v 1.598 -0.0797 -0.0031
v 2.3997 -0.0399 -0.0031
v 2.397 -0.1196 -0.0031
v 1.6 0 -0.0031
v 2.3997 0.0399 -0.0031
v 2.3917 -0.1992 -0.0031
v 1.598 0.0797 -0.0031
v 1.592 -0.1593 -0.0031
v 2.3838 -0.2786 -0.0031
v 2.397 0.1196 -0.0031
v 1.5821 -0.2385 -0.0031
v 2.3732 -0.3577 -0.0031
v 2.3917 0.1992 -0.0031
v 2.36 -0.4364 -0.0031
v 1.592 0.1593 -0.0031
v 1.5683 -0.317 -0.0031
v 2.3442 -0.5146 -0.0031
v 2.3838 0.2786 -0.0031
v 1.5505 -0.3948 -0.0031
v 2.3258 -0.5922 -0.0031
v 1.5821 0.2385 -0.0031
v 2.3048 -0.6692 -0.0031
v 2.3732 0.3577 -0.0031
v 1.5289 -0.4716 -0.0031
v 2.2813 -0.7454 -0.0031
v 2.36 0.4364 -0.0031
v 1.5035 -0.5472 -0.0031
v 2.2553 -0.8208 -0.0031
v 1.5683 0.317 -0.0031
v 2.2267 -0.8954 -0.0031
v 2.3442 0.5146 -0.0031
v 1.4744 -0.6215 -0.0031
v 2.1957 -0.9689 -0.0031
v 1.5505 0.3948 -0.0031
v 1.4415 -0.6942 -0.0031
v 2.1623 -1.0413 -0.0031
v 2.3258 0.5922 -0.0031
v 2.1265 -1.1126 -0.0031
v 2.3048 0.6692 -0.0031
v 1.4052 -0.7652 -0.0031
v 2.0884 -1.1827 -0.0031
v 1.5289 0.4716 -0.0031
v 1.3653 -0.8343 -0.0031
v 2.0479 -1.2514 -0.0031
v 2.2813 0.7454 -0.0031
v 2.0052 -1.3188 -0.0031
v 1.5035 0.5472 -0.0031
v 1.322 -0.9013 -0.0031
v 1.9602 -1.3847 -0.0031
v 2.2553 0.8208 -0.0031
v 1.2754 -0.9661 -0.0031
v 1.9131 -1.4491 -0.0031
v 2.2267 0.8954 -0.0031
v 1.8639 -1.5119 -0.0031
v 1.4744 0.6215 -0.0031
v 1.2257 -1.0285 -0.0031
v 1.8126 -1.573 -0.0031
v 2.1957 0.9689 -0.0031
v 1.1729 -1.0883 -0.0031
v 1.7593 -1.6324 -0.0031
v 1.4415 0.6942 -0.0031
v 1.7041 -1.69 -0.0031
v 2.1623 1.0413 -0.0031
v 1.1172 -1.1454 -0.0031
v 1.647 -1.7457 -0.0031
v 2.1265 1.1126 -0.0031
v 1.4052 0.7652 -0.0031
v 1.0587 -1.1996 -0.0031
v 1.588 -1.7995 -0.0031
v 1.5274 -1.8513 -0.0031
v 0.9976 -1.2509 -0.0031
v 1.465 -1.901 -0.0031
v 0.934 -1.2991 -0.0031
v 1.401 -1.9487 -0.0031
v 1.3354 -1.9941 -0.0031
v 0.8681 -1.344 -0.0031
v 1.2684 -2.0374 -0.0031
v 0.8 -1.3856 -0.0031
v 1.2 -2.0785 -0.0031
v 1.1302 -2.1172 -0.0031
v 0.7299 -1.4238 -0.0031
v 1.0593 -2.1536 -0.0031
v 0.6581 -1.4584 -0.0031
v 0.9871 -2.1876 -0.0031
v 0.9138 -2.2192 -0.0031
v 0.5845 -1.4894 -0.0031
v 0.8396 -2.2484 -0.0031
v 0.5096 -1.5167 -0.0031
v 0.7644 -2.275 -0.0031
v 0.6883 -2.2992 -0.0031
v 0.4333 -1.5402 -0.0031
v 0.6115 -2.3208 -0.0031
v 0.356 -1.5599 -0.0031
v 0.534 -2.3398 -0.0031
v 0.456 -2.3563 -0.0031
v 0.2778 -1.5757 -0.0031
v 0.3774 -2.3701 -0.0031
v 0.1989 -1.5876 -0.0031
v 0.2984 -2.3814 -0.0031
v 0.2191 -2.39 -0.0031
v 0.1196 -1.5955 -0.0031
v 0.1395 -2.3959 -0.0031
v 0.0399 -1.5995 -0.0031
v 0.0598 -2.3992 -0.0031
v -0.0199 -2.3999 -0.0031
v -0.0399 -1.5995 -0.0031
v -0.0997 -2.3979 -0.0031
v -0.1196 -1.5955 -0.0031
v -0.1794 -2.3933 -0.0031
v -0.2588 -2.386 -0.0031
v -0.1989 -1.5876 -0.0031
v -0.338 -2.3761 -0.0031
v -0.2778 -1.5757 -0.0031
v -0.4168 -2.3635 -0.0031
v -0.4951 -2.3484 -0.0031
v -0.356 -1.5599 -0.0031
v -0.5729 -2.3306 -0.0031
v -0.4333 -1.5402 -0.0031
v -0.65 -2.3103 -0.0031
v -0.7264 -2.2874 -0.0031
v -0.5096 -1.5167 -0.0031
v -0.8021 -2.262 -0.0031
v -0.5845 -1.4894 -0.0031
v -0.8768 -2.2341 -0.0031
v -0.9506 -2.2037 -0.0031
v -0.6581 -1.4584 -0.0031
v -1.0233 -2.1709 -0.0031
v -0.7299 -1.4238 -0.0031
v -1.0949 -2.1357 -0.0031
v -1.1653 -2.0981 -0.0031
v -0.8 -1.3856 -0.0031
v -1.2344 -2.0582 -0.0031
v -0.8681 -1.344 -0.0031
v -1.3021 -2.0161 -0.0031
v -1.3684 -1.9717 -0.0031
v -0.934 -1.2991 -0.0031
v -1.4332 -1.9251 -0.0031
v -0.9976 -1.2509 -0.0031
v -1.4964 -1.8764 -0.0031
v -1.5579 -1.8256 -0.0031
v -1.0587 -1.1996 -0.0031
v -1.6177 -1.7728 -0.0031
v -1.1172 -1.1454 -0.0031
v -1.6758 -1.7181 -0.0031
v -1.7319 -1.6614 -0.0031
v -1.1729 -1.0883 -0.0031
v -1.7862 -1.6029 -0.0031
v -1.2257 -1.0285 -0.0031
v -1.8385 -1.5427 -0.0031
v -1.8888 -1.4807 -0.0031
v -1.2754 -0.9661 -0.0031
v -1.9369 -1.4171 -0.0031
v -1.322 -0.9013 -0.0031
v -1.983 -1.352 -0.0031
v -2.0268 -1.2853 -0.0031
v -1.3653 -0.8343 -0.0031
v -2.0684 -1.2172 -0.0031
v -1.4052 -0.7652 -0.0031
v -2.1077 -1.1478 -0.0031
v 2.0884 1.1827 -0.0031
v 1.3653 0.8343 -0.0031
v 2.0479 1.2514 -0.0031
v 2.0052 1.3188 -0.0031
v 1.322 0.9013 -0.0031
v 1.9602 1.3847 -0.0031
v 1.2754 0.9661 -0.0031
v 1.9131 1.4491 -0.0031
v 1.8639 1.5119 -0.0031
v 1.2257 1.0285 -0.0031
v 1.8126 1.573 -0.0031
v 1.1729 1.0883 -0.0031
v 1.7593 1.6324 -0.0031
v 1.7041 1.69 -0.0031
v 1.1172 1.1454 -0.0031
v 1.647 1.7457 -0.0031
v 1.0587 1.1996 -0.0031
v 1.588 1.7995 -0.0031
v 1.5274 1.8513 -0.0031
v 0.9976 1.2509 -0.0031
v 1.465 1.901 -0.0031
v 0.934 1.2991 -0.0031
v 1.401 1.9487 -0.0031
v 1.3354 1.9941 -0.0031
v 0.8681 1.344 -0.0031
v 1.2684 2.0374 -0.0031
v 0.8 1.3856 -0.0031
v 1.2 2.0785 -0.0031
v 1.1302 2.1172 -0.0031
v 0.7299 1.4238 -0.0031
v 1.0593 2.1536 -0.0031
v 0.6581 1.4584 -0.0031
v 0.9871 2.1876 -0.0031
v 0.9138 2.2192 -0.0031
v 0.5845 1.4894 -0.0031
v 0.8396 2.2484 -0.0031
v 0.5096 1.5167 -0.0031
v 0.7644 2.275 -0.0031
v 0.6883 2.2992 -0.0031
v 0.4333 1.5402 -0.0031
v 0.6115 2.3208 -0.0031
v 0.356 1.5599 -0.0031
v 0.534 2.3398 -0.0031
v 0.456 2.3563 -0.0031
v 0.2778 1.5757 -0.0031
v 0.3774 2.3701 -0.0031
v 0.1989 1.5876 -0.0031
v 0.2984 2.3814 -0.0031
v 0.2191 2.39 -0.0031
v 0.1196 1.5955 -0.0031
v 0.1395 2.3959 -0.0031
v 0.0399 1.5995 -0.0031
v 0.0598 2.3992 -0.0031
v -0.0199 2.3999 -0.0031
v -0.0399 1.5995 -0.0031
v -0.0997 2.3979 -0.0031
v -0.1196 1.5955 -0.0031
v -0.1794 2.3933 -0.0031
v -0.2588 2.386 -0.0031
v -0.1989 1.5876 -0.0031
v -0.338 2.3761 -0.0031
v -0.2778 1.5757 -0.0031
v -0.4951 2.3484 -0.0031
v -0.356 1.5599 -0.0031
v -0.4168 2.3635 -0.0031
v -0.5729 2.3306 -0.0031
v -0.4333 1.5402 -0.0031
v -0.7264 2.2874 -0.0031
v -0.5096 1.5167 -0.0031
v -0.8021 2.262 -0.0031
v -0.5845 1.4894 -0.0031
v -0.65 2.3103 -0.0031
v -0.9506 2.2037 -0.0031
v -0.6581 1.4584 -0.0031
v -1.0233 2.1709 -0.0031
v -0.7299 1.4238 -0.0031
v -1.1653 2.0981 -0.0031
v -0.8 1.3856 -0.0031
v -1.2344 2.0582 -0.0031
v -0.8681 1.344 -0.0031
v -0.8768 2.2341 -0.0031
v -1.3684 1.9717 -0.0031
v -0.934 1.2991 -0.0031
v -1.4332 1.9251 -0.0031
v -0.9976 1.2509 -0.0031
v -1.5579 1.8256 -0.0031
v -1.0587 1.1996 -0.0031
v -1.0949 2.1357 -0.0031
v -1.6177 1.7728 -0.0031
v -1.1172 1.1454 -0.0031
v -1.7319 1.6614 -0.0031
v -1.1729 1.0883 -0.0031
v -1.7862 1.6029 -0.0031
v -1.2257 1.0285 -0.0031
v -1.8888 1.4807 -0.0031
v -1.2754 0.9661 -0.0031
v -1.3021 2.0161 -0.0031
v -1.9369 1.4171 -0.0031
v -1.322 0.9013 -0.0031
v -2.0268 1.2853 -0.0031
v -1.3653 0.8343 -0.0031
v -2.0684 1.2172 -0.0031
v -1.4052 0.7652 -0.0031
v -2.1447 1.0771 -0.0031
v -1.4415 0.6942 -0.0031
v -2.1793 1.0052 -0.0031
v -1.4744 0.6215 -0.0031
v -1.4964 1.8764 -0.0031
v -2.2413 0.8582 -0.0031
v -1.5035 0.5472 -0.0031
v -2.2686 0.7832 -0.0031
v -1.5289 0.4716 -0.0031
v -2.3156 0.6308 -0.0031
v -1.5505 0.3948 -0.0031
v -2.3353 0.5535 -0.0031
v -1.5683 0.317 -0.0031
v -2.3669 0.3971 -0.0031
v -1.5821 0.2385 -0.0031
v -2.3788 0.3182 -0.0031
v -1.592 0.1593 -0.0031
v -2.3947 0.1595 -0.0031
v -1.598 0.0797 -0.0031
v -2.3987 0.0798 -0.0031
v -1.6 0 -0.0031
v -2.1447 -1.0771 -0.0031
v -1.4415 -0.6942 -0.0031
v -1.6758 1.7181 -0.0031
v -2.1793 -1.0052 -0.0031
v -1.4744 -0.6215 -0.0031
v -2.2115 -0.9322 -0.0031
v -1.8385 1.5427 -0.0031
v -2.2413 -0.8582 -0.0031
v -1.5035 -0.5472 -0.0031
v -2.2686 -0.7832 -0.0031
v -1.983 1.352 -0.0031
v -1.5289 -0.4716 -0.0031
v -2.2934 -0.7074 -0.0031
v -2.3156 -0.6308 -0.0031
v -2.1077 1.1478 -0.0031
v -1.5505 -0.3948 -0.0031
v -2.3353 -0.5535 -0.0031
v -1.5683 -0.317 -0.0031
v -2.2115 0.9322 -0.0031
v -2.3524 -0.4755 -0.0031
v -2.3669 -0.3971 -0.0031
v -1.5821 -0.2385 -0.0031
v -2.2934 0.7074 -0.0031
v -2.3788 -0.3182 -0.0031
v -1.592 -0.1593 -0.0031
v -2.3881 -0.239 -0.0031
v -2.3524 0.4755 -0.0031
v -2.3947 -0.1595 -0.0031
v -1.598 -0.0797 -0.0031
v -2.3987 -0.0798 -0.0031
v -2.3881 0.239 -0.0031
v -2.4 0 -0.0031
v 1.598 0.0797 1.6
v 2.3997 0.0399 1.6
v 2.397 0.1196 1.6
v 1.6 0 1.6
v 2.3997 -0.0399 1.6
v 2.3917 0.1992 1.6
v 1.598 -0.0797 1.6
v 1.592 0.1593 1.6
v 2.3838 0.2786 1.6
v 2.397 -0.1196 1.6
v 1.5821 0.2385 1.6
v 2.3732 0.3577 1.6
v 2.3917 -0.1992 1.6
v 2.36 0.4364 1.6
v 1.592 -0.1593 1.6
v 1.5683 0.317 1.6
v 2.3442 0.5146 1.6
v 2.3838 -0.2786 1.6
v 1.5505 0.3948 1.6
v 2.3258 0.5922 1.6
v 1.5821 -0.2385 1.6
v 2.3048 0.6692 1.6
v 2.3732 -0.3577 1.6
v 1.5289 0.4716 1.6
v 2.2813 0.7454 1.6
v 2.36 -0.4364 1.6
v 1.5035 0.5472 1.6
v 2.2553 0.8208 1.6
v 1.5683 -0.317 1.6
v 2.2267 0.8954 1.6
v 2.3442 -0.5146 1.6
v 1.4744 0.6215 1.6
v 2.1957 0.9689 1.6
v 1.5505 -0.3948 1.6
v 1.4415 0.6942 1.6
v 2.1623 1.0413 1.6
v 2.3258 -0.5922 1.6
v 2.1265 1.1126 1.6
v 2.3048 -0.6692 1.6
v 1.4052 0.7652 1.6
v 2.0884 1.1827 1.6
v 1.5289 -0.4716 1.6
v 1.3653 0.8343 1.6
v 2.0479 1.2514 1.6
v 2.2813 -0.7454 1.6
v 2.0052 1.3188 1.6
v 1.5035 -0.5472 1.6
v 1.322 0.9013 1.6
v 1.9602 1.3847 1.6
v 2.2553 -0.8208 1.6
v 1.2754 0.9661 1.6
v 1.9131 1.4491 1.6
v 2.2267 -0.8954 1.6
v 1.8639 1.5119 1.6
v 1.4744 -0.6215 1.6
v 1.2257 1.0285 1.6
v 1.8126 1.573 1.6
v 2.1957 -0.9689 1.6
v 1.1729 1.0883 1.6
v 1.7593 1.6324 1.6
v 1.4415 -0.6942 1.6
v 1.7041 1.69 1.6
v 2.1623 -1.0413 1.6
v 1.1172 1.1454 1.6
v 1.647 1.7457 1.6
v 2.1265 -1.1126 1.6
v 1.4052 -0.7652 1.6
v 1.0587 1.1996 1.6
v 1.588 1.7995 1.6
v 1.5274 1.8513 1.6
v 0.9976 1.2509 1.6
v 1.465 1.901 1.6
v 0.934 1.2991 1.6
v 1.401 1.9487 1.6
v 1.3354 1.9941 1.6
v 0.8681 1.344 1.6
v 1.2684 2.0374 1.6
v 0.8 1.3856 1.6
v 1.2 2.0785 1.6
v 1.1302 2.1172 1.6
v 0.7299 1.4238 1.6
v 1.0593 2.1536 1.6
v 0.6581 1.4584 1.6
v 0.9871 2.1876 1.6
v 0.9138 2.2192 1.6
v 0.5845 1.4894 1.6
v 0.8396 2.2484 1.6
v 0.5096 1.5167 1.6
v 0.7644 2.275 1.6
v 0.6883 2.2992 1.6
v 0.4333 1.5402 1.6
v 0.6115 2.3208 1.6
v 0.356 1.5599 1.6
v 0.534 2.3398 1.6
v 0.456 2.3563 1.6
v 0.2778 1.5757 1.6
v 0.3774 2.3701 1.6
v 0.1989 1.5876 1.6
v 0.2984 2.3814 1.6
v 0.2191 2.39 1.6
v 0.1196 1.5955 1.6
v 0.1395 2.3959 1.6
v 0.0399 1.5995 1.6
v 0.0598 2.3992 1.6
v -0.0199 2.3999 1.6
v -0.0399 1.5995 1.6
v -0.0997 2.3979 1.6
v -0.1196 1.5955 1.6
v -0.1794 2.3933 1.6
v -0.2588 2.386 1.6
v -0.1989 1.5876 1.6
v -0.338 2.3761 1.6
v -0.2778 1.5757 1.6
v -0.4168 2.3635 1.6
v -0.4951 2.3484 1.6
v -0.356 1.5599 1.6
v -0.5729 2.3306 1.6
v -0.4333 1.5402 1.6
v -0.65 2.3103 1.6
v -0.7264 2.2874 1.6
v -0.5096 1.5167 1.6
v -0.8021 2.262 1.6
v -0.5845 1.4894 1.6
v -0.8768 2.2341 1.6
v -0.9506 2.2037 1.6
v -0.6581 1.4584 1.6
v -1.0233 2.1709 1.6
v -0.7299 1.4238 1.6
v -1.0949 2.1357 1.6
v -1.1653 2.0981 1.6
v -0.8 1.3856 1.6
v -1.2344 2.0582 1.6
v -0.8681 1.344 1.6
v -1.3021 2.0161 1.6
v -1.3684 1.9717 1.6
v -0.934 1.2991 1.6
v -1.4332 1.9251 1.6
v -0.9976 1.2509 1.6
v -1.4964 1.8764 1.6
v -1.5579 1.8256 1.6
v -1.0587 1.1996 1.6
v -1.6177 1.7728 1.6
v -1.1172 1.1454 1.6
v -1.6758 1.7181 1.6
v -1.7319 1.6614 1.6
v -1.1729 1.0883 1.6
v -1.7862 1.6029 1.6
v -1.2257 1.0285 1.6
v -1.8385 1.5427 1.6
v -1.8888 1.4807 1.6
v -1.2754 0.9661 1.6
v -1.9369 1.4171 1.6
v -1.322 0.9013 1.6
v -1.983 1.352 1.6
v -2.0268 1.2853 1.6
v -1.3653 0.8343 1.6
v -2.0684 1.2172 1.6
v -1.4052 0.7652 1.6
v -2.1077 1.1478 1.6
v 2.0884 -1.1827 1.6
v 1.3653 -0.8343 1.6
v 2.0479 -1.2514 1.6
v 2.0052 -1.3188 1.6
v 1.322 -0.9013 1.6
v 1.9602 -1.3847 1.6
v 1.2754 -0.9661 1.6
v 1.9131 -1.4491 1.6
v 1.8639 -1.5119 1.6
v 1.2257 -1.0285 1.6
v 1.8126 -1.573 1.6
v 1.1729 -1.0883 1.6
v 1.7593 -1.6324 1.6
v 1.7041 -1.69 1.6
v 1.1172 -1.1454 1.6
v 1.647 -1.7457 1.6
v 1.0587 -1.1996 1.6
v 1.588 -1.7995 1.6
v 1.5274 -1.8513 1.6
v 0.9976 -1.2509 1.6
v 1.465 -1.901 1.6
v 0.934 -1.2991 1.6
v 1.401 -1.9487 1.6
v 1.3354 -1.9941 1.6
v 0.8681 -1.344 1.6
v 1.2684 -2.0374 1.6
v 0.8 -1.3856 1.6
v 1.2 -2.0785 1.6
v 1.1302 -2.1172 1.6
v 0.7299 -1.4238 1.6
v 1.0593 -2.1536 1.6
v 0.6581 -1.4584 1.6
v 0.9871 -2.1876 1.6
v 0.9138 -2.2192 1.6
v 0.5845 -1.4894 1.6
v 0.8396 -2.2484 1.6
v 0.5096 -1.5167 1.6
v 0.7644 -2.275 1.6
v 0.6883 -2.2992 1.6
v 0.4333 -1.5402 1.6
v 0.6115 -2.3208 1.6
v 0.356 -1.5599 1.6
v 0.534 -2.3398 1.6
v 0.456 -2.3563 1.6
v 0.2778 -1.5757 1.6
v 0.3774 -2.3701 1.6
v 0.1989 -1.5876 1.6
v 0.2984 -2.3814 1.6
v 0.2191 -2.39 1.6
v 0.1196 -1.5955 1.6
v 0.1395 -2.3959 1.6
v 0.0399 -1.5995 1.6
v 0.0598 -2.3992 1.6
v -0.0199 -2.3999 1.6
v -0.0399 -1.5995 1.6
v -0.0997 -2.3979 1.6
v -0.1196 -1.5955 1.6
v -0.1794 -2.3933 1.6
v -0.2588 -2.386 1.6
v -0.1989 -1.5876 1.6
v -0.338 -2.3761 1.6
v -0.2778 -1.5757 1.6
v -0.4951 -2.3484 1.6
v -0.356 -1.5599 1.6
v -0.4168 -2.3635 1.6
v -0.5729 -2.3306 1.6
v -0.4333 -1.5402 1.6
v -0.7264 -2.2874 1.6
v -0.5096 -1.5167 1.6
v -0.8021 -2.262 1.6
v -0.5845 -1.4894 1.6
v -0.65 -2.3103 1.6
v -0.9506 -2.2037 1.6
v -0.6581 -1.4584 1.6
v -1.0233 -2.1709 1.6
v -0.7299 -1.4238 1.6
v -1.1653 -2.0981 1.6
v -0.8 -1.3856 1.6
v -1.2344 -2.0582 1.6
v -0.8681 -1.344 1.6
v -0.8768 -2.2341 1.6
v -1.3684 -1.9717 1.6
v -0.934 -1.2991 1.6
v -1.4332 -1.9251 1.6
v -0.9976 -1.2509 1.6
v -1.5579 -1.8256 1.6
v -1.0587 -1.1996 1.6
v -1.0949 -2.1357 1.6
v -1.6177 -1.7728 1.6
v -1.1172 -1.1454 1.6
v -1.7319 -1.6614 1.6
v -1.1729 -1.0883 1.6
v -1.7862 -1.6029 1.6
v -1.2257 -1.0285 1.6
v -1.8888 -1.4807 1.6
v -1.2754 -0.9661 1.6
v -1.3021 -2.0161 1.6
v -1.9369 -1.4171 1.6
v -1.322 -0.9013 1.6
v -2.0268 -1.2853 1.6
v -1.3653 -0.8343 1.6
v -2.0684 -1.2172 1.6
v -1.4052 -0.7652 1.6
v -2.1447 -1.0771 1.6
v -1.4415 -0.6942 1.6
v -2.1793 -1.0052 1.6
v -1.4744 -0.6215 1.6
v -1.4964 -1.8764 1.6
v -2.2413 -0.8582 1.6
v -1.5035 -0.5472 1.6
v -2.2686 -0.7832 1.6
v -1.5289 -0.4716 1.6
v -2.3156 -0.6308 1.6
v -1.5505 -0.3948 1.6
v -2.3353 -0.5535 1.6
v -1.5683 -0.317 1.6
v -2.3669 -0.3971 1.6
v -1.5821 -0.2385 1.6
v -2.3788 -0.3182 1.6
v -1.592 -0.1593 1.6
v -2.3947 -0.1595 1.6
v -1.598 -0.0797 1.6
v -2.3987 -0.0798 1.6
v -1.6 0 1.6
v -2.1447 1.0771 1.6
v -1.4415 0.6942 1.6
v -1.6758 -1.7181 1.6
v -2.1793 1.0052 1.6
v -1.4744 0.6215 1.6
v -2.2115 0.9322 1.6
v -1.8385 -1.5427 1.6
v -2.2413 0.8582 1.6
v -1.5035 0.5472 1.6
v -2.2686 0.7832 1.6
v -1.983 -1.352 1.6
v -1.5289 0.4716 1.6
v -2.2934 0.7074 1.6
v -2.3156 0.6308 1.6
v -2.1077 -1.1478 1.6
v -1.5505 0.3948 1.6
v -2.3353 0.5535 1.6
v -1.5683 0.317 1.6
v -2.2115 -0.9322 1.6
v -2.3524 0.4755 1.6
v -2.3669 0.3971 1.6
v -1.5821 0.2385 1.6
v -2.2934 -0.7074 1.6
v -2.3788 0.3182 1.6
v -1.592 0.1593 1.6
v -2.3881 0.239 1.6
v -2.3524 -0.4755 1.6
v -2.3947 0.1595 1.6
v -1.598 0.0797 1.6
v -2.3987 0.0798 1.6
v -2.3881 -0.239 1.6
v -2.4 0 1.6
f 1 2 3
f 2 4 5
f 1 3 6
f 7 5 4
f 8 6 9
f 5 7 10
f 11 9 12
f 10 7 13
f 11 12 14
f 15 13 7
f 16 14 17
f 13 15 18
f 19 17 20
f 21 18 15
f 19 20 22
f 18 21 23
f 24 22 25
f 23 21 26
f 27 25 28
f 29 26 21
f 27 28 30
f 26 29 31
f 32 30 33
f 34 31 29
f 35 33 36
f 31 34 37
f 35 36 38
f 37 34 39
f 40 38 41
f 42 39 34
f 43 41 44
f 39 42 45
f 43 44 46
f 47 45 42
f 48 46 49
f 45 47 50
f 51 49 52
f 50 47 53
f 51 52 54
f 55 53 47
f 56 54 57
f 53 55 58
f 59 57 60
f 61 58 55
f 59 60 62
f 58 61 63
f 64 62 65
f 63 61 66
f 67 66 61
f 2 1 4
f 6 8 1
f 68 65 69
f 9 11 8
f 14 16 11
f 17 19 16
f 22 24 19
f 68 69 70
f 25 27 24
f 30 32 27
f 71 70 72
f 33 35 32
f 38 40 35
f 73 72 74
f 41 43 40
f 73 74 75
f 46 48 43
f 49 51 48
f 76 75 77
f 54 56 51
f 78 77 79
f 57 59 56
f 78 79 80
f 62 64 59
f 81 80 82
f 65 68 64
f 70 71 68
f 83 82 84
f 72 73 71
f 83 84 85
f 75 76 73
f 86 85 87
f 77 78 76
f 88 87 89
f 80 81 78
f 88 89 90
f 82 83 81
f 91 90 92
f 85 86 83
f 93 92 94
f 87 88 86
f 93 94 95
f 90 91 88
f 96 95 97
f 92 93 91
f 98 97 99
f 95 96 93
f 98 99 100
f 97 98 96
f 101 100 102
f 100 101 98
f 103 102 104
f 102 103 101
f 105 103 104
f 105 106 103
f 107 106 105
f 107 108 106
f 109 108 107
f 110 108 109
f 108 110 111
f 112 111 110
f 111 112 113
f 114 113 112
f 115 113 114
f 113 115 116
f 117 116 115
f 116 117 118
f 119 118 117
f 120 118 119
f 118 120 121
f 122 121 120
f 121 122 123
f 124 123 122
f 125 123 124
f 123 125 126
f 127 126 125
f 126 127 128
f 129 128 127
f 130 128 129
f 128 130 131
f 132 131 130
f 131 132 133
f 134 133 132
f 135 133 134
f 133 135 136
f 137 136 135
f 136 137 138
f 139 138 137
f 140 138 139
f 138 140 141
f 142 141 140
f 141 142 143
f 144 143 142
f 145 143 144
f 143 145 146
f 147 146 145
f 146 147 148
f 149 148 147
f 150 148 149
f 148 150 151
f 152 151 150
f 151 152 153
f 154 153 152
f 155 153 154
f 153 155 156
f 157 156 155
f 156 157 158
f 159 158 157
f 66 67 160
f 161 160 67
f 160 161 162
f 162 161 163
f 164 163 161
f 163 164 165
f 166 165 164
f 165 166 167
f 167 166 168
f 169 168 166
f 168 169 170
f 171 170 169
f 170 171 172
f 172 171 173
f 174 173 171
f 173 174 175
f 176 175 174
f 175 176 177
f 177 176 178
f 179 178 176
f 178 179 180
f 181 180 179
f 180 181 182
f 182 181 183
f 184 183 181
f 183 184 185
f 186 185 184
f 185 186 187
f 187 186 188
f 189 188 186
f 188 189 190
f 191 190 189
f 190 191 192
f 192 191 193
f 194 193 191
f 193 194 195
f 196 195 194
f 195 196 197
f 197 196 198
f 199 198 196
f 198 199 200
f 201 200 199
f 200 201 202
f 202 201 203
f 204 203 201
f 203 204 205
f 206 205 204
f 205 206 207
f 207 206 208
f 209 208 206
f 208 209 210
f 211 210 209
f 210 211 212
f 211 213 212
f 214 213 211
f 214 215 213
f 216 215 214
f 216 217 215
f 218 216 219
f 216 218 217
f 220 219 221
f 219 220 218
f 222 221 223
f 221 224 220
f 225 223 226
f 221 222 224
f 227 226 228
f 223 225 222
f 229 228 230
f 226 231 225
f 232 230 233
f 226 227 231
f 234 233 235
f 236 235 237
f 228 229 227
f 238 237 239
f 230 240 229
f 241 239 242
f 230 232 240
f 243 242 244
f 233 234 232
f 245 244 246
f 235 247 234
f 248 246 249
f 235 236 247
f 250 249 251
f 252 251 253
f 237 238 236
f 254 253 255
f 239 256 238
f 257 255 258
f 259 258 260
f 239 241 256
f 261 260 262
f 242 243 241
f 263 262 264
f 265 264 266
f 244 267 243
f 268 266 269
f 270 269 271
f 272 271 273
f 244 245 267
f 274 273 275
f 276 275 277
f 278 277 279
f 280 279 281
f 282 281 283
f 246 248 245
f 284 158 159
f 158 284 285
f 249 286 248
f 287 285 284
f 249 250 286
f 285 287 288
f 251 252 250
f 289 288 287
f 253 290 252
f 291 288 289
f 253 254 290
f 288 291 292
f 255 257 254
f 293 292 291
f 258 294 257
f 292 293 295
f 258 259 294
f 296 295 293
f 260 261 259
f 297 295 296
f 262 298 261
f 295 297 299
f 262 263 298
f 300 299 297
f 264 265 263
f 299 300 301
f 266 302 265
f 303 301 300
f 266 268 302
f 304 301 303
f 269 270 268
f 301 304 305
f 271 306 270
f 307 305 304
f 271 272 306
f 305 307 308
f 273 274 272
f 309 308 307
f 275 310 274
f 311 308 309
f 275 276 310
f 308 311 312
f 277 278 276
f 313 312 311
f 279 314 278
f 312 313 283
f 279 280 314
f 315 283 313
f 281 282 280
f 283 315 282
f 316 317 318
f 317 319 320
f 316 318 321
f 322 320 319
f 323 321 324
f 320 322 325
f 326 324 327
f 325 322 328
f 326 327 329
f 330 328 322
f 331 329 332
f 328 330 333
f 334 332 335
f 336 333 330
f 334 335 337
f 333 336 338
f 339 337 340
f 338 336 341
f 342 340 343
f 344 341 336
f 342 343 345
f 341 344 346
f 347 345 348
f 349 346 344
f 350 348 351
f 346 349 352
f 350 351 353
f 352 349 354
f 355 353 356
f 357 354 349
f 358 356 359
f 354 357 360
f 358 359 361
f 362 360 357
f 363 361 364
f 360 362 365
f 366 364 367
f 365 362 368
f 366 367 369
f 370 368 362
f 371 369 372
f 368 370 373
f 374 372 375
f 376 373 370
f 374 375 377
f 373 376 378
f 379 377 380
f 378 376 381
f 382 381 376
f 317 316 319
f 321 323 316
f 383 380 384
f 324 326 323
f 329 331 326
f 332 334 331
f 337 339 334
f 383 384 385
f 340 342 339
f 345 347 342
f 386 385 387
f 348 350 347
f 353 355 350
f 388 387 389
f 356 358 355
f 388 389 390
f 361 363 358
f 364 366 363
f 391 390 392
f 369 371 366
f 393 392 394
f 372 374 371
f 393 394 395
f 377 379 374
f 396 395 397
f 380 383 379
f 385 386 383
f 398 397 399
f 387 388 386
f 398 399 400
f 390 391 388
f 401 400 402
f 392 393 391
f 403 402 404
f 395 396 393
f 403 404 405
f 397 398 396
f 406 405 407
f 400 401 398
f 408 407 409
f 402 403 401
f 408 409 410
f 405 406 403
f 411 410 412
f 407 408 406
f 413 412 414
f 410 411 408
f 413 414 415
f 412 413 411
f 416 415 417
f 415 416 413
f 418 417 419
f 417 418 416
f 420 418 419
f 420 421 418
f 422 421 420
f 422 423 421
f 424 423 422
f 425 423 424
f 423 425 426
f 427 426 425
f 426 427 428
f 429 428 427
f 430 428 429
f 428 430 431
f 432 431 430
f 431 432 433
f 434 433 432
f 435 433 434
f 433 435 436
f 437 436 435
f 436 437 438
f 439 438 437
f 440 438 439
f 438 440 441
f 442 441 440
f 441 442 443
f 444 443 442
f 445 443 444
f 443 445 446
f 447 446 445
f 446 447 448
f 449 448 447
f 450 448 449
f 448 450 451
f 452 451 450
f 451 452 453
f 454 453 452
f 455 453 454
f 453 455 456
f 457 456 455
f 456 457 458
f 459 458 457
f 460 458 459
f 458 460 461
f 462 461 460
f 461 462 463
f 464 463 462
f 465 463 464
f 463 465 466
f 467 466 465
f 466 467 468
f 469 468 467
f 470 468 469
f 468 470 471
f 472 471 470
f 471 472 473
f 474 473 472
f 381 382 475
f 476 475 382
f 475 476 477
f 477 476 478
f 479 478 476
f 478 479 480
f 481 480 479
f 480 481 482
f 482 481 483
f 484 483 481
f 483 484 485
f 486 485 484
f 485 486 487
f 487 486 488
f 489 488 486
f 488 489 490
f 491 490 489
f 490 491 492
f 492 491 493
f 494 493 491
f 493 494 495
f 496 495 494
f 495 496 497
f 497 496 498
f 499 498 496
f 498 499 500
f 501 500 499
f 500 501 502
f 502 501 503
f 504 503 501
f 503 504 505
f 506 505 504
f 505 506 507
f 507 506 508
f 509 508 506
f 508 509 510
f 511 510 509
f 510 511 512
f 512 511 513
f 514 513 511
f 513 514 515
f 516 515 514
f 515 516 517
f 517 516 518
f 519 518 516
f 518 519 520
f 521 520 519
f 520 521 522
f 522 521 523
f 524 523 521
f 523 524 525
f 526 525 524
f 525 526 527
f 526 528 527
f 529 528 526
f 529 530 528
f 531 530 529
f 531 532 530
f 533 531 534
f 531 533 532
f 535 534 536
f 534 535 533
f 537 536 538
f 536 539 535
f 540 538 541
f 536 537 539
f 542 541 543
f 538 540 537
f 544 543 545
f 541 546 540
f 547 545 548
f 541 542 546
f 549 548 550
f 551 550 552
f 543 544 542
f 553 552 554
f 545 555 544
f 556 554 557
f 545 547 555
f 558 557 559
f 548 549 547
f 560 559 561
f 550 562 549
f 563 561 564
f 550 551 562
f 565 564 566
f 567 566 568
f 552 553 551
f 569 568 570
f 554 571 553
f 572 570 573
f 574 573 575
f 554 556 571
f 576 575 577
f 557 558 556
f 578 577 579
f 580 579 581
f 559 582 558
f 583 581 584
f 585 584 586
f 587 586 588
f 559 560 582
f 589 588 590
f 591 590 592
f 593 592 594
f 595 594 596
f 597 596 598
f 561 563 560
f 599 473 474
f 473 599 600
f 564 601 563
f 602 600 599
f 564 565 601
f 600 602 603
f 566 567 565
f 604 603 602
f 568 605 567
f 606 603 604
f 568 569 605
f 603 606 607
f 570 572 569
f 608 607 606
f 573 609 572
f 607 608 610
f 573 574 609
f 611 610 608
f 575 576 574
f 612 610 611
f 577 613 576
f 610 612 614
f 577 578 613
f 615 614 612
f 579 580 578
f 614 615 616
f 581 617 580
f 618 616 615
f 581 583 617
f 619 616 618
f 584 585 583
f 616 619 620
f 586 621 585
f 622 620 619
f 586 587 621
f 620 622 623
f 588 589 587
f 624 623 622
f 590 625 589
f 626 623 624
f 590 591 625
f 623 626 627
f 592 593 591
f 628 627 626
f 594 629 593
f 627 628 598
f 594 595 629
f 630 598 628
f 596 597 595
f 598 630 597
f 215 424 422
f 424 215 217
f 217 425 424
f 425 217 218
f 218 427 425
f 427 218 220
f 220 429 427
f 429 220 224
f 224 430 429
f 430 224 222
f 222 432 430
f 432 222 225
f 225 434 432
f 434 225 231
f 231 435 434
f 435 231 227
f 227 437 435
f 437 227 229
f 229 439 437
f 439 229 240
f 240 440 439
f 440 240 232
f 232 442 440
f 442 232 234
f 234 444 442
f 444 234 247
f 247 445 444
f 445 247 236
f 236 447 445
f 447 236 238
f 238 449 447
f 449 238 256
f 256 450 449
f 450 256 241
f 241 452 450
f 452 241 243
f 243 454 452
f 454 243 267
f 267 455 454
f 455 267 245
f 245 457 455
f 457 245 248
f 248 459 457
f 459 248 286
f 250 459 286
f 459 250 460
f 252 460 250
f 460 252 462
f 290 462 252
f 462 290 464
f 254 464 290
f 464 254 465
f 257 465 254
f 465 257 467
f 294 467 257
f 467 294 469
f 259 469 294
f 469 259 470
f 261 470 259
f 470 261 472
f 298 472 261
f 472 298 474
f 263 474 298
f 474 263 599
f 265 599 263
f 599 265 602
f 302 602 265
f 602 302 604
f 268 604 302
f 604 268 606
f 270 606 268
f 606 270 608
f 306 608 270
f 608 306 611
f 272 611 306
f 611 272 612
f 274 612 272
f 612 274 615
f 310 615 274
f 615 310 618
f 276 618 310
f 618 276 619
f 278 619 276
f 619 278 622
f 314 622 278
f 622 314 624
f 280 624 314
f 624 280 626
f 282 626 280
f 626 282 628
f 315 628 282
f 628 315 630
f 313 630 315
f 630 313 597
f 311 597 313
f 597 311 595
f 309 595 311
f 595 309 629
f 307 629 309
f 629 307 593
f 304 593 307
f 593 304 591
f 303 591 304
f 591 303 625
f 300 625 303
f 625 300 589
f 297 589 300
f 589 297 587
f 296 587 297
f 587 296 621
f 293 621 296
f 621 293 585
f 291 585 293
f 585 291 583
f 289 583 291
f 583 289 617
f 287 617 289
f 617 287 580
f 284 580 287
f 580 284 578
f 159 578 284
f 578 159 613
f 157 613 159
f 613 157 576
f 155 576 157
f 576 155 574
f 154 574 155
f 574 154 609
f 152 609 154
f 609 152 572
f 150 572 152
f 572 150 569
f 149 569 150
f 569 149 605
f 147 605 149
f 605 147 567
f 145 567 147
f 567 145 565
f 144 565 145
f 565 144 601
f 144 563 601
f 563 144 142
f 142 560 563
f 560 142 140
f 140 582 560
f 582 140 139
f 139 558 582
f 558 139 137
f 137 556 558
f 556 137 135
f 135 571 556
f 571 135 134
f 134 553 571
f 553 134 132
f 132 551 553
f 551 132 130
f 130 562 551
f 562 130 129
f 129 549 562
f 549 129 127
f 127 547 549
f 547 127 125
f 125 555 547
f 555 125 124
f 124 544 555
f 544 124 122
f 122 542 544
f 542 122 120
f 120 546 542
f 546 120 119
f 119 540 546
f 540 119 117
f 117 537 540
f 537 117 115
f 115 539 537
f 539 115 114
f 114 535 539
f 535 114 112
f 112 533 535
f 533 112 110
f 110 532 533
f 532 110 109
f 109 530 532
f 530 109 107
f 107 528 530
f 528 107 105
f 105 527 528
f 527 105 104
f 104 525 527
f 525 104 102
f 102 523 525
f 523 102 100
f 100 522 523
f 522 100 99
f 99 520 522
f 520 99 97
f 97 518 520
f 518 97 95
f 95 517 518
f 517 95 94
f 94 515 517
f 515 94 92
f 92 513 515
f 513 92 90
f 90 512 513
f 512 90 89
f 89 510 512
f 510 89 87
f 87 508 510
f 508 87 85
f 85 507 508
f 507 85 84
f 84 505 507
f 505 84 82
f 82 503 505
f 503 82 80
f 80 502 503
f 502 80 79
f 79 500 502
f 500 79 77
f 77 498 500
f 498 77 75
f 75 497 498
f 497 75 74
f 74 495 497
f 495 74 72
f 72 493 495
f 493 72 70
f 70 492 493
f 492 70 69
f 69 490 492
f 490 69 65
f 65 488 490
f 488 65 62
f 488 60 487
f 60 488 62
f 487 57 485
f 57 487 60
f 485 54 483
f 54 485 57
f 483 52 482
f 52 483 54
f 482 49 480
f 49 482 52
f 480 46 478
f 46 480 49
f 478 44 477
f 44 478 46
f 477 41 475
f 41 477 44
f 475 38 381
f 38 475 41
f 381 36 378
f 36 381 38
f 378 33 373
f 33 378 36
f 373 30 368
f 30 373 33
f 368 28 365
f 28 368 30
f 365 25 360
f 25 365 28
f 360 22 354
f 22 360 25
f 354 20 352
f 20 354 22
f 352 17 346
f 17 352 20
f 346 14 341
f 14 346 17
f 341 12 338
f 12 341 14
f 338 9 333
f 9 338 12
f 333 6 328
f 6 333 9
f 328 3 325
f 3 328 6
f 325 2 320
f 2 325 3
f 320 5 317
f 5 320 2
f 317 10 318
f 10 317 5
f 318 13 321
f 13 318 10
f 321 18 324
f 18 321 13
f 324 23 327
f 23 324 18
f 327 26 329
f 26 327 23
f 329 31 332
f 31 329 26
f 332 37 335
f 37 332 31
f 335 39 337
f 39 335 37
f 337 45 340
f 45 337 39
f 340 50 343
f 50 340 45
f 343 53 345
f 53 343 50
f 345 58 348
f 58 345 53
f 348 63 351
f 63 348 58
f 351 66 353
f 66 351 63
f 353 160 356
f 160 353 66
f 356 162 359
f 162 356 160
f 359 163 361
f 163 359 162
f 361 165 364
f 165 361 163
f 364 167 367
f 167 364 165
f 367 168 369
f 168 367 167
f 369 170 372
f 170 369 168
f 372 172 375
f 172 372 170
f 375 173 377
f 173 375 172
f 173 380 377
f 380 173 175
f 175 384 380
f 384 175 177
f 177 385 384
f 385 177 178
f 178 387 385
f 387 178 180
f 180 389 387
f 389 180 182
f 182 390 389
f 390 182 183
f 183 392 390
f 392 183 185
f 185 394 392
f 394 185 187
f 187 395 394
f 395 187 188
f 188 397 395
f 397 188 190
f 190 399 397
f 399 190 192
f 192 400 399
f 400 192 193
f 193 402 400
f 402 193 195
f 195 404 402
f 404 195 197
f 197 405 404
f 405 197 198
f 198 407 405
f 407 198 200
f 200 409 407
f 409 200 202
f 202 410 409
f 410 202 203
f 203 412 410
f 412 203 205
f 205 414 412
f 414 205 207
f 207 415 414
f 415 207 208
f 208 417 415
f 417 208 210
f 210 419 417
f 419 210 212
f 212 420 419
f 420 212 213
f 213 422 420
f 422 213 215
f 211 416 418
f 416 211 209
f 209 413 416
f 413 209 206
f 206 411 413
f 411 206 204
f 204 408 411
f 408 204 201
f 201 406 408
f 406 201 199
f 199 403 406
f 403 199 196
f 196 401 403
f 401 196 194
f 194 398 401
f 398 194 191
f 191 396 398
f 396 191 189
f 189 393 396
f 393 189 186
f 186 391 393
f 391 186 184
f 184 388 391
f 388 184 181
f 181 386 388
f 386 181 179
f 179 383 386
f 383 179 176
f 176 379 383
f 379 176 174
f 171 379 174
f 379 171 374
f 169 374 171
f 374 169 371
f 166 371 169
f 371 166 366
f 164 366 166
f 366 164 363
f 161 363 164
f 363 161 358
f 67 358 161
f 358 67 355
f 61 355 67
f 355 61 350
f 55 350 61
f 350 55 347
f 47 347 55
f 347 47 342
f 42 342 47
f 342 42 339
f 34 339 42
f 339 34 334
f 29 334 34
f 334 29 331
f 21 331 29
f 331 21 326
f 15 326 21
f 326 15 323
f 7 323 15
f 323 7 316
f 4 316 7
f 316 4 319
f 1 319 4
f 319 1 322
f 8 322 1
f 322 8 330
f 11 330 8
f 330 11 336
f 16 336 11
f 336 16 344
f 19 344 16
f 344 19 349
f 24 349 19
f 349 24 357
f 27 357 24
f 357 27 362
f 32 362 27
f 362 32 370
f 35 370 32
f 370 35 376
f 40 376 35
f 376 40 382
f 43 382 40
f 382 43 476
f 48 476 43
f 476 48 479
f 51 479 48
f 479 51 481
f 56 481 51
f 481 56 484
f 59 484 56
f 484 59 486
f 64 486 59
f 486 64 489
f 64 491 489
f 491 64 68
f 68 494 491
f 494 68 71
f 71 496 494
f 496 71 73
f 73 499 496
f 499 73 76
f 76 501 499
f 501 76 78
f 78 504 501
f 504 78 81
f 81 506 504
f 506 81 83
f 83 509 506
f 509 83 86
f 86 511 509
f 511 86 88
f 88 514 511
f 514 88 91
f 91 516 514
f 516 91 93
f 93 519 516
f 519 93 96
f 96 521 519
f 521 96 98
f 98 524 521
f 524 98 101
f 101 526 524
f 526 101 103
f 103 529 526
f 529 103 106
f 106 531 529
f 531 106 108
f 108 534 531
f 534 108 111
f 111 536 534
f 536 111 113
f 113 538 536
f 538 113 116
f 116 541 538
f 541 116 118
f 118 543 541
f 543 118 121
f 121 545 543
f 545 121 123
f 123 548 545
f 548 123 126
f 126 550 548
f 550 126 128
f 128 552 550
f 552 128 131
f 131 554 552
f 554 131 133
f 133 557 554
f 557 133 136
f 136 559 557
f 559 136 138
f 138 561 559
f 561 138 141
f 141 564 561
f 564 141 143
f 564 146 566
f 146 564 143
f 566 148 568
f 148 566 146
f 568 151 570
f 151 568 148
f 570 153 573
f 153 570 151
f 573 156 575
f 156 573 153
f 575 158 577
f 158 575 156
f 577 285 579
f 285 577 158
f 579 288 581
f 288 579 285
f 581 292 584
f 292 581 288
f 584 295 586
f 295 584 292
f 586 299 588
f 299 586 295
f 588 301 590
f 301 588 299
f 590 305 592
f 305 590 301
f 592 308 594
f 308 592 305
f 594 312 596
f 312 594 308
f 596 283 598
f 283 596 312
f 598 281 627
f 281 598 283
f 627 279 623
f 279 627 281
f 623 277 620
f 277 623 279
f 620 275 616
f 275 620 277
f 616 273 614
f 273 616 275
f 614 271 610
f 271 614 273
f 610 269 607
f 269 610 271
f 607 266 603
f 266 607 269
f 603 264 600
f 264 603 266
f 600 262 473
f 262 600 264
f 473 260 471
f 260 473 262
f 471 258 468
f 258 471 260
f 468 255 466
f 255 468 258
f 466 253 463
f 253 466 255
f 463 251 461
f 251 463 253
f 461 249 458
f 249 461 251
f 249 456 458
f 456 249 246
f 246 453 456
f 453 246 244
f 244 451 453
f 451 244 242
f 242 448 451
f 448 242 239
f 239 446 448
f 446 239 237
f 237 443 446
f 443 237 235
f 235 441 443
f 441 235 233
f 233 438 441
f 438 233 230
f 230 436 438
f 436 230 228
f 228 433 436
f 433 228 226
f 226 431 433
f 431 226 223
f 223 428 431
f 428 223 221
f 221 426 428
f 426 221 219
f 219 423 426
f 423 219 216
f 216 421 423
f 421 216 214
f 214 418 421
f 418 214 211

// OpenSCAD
use <../lib.scad>
use <s/3626cs02.scad>
use <s/3626p8cs01.scad>
$fa=1; $fs=0.2;
function ldraw_lib__3626cp8c(realsolid=false) = [
// 0 Minifig Head Peach Lips, Smile, Black Eyebrows Pattern (Hollow Stud)
// 0 Name: 3626cp8c.dat
// 0 Author: Howard Lande [HowardLande]
// 0 !LDRAW_ORG Part UPDATE 2015-01
// 0 !LICENSE Licensed under CC BY 2.0 and CC BY 4.0 : see CAreadme.txt
// 
// 0 BFC CERTIFY CCW
  [0,"BFC","CERTIFY"],
  [0,"BFC","CCW"],
// 
// 0 !HISTORY 2015-10-11 [PTadmin] Official Update 2015-01
// 
// 
// 1 16 0 0 0 1 0 0 0 1 0 0 0 1 s\3626cs02.dat
  [1,16,0,0,0,1,0,0,0,1,0,0,0,1, ldraw_lib__s__3626cs02(realsolid)],
// 1 16 0 0 0 1 0 0 0 1 0 0 0 1 s\3626p8cs01.dat
  [1,16,0,0,0,1,0,0,0,1,0,0,0,1, ldraw_lib__s__3626p8cs01(realsolid)],
];
module ldraw_lib__3626cp8c(step=0, col=false, unit=2/5, alt=false, line=0.2, solid=!$preview)
    makepoly(ldraw_lib__3626cp8c(solid), step=step, col=col, unit=unit, alt=alt, line=line, solid=solid);
ldraw_lib__3626cp8c(line=0.2);
